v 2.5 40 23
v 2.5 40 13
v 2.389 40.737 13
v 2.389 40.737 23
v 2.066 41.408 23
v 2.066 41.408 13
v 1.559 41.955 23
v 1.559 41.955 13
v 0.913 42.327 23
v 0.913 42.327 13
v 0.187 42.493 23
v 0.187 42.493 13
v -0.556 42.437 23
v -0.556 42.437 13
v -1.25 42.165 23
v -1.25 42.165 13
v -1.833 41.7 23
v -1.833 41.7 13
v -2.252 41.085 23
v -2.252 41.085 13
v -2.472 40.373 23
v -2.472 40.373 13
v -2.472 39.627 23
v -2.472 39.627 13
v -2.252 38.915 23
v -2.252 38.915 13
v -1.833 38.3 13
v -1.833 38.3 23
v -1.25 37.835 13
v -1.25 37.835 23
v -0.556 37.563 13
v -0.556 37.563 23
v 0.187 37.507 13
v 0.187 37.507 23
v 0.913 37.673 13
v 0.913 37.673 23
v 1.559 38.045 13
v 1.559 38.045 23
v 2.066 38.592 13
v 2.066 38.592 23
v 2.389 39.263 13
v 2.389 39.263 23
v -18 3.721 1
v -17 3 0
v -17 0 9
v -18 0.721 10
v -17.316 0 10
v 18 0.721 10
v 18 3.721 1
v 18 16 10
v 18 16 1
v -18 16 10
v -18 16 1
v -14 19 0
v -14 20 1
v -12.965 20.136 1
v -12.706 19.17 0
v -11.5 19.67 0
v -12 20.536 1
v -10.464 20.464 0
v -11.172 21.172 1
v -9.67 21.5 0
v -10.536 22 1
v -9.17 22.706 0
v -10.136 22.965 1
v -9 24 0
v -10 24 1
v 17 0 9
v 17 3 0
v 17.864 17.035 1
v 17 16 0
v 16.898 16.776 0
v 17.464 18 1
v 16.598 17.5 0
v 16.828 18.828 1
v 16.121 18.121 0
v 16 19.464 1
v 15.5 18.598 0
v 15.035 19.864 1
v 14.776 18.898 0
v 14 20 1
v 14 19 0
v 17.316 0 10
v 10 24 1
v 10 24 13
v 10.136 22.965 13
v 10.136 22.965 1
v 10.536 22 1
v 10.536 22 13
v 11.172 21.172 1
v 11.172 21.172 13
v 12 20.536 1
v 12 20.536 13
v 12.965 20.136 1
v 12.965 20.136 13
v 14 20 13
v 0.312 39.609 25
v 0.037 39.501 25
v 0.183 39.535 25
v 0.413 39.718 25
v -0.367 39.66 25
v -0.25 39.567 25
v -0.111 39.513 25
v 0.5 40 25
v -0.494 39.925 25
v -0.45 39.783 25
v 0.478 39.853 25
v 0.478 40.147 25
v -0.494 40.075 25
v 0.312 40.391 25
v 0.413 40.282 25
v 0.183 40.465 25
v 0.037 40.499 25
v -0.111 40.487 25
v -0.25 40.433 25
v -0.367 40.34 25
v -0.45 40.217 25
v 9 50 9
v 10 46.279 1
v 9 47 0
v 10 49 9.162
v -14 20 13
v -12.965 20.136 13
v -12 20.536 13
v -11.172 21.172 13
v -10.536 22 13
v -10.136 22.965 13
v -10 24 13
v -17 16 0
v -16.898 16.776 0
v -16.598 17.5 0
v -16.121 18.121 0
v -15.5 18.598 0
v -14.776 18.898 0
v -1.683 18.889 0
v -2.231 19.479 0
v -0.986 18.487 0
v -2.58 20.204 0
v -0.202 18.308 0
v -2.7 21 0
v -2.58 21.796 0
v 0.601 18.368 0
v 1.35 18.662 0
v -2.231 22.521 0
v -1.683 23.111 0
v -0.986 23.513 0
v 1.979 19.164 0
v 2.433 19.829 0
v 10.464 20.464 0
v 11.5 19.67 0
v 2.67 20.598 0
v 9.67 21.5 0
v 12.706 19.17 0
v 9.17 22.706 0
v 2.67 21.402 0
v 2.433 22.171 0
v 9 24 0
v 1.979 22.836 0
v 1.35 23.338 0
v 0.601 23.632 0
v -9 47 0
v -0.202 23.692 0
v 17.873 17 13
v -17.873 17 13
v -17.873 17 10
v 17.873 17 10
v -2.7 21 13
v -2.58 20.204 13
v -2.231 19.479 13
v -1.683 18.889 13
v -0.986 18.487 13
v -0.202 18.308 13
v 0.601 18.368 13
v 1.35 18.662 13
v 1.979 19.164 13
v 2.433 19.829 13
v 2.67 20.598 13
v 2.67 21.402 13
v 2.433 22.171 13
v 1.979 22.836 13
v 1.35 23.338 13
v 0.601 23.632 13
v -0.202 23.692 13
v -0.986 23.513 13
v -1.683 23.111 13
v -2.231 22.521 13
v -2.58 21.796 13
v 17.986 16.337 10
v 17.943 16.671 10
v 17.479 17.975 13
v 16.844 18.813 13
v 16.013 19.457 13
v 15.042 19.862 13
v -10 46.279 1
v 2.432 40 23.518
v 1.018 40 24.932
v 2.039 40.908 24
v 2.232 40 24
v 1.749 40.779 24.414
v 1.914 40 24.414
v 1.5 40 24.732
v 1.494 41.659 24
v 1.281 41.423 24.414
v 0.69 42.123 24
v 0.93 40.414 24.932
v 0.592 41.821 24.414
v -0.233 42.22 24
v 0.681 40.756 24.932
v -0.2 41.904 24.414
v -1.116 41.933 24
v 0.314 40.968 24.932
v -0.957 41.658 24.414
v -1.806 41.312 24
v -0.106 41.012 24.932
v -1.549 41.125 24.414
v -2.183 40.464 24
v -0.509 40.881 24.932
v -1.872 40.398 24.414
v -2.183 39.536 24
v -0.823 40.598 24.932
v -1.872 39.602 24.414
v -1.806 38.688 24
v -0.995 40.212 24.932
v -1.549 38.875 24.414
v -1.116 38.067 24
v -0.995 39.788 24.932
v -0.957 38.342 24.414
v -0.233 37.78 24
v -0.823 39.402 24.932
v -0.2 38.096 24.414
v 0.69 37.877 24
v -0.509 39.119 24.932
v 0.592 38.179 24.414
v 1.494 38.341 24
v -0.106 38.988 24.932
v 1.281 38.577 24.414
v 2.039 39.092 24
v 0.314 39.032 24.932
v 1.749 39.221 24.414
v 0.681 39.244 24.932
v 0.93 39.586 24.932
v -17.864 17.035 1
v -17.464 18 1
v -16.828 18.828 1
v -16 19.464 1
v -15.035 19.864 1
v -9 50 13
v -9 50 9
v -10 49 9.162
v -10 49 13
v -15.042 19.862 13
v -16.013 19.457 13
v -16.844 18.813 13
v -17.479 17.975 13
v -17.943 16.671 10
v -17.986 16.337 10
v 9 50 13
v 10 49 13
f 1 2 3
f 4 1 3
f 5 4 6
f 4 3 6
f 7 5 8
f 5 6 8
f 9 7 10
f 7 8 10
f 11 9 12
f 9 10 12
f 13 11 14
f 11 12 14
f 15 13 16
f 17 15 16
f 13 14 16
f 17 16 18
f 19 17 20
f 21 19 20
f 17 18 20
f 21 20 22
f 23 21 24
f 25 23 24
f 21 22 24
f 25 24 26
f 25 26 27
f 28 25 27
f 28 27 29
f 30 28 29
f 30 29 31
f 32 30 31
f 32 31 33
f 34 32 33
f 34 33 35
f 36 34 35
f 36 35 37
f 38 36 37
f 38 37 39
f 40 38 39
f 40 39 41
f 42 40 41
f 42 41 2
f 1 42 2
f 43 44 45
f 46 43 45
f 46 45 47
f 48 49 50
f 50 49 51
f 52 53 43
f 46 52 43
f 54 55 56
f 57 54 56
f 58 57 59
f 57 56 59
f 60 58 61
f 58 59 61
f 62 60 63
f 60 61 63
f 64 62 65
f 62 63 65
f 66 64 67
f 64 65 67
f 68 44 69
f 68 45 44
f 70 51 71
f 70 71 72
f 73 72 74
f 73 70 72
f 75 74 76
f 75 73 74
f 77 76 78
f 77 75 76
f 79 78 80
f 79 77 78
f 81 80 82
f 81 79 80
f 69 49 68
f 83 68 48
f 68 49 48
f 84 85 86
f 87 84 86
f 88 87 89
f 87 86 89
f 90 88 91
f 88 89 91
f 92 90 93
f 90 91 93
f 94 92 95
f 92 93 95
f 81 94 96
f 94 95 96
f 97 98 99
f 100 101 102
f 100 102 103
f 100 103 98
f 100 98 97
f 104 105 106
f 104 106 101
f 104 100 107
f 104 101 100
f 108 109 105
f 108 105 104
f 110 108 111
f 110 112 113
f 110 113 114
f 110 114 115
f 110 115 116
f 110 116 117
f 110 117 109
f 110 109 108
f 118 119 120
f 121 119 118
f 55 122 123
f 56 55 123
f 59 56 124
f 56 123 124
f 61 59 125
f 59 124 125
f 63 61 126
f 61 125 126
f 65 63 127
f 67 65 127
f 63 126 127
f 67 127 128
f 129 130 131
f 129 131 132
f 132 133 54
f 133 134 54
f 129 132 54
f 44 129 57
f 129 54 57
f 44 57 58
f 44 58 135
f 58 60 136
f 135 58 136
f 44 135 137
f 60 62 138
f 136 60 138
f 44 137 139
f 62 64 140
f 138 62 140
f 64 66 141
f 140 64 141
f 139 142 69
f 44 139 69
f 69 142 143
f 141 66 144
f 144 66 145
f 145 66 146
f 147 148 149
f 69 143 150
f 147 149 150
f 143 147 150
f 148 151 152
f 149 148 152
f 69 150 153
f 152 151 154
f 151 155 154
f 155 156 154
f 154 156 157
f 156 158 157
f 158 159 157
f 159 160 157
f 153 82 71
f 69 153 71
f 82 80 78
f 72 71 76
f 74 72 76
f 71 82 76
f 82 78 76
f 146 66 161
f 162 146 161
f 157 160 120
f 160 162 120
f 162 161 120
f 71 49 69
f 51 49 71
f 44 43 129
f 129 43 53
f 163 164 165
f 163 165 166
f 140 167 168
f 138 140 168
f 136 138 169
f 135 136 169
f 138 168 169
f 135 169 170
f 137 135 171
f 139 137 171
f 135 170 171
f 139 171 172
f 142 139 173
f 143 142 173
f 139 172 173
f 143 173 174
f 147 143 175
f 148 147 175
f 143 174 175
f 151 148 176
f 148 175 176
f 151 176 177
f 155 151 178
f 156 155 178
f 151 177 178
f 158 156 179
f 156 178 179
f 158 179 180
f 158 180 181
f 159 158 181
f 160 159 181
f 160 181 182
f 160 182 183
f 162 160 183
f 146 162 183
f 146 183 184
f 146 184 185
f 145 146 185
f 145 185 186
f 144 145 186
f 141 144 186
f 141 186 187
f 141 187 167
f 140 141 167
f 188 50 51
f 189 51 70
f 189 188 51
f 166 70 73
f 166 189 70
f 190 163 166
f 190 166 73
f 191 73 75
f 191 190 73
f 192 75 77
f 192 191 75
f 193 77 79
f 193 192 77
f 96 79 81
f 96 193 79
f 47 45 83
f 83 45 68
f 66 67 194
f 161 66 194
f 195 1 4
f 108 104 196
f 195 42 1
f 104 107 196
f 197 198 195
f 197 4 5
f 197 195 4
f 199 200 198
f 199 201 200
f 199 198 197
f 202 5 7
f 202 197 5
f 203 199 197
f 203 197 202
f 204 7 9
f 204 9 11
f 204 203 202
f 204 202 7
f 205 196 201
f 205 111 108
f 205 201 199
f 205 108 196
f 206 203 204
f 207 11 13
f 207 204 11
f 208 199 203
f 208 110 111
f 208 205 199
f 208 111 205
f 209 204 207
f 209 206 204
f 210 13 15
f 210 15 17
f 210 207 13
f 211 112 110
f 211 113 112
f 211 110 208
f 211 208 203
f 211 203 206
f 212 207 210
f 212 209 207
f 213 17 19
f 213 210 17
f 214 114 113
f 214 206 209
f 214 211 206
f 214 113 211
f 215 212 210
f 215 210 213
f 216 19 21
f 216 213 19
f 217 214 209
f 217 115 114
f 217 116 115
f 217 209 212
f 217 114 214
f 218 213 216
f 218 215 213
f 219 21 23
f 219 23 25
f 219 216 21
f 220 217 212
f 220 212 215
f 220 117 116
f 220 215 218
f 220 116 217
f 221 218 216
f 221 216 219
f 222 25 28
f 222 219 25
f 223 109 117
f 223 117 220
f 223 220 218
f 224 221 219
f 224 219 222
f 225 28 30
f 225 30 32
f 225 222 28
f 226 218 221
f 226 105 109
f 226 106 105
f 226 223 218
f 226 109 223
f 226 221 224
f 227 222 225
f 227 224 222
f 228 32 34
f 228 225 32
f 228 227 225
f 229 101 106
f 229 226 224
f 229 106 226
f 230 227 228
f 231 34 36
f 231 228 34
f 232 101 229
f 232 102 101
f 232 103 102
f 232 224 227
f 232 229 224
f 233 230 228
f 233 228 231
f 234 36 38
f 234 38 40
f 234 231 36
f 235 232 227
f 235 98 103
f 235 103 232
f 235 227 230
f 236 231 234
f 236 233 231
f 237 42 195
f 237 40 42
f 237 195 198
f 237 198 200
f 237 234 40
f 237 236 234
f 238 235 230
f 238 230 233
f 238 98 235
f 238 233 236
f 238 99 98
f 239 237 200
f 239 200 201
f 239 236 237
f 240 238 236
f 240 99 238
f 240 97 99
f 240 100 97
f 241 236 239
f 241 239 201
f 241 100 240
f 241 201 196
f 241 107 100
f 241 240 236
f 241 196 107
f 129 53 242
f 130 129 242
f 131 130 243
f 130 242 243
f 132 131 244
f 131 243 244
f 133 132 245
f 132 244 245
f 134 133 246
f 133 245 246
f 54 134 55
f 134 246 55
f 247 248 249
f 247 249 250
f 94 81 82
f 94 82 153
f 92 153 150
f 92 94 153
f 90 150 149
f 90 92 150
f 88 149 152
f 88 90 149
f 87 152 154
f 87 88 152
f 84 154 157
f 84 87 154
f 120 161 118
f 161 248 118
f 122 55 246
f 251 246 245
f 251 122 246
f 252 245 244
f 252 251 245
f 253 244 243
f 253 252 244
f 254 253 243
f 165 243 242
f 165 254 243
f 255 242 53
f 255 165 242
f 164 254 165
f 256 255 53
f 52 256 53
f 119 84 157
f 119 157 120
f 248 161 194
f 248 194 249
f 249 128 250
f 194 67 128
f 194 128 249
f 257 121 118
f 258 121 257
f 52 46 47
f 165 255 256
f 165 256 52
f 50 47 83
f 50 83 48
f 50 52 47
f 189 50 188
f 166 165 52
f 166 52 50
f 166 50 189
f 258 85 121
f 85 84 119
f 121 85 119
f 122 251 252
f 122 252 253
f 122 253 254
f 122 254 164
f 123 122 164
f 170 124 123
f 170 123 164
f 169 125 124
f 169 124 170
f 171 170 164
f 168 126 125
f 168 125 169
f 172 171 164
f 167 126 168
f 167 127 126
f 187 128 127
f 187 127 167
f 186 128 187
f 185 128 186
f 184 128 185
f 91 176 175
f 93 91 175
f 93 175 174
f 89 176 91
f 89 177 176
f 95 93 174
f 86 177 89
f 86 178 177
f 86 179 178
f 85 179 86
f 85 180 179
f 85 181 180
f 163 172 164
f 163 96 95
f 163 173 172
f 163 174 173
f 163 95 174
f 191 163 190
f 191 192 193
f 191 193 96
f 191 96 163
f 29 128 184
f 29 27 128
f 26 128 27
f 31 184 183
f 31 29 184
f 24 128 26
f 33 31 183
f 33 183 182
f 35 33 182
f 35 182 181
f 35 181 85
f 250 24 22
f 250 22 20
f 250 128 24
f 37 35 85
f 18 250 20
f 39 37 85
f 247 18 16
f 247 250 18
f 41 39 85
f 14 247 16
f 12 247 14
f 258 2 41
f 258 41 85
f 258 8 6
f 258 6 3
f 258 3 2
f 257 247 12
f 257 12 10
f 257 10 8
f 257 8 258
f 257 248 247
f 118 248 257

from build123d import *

# Parameters (mm, degrees)
F0_W     = 20
F0_H     = 30
F0_R     = 2.5
F1_DEPTH = 13
F2_W     = 36
F2_H     = 17
F3_DEPTH = 3
F4_D     = 5.4
F5_DEPTH = 25
F6_R     = 2
F7_R     = 3.99999
F8_SIZE2 = 9
F8_SIZE  = 3
F9_SIZE  = 1


# Not quite as in the source:
# - a fillet or chamfer is up to 0.001 mm smaller than in the source, because OpenCascade refuses the exact size


with BuildPart() as f1:
    # F0 (on Top) → F1 (new body)
    with BuildSketch(Plane.XY):
        Polygon((-18, 20), (-18, 0), (18, 0), (18, 20), (10, 20), (-10, 20), align=None)
        with Locations((0, 35)):
            Rectangle(F0_W, F0_H)
        with Locations((0, 40)):
            Circle(F0_R, mode=Mode.SUBTRACT)
        with Locations((0, 40)):
            Circle(F0_R)
    extrude(amount=F1_DEPTH)

    # F2 (on face) → F3 (cut)
    with BuildSketch(Plane.XY.offset(13)):
        with Locations((0, 8.5)):
            Rectangle(F2_W, F2_H)
    extrude(amount=-F3_DEPTH, mode=Mode.SUBTRACT)

    # F4 (through all)
    with Locations(Plane(origin=(0, 0, 0), x_dir=(1, 0, 0), z_dir=(0, 0, -1))):
        with Locations((0, -21)):
            Hole(F4_D / 2)

    # F0 (on Top) → F5 (join)
    with BuildSketch(Plane.XY):
        with Locations((0, 40)):
            Circle(F0_R)
    extrude(amount=F5_DEPTH)

    # F6
    f6_edges = [f1.edges().sort_by_distance(p)[0] for p in [
        (-2.5, 40, 25),
    ]]
    fillet(f6_edges, radius=F6_R)

    # F7 (radius 4 in the source; OpenCascade refuses exactly that, so slightly less here)
    f7_edges = [f1.edges().sort_by_distance(p)[0] for p in [
        (-18, 20, 6.5),
        (18, 20, 6.5),
        (-10, 20, 6.5),
        (10, 20, 6.5),
    ]]
    fillet(f7_edges, radius=F7_R)

    # F8
    f8_edges = [f1.edges().sort_by_distance(p)[0] for p in [
        (0, 50, 0),
        (0, 0, 0),
    ]]
    f8_side = f1.faces().sort_by_distance((-17.383883, 8.000005, 0))[0]
    chamfer(f8_edges, length=F8_SIZE, length2=F8_SIZE2, reference=f8_side)

    # F9
    f9_edges = [f1.edges().sort_by_distance(p)[0] for p in [
        (16.82843, 18.82843, 0),
        (11.17157, 21.17157, 0),
        (-11.17157, 21.17157, 0),
        (-16.82843, 18.82843, 0),
        (18, 1.5, 4.5),
        (-18, 1.5, 4.5),
        (-10, 50, 11),
        (-10, 48.5, 4.5),
        (10, 50, 11),
        (10, 48.5, 4.5),
    ]]
    chamfer(f9_edges, length=F9_SIZE)


solid = f1.part
